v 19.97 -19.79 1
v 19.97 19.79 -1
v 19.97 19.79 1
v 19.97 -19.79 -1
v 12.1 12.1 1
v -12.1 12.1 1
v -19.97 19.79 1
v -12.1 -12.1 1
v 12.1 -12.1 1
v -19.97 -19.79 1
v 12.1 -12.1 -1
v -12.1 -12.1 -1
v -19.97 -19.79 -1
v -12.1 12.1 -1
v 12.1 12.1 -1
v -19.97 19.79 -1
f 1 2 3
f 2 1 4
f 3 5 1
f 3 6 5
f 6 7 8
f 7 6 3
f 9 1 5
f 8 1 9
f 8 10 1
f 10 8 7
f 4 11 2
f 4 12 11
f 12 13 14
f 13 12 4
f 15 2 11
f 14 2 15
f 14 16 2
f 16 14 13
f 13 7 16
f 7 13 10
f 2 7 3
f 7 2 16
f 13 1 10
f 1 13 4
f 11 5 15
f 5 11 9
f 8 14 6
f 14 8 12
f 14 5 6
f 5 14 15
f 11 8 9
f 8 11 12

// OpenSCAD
difference() {
    cube([39.94,39.58,2],true);
    cube([24.2,24.2,4],true);
}
